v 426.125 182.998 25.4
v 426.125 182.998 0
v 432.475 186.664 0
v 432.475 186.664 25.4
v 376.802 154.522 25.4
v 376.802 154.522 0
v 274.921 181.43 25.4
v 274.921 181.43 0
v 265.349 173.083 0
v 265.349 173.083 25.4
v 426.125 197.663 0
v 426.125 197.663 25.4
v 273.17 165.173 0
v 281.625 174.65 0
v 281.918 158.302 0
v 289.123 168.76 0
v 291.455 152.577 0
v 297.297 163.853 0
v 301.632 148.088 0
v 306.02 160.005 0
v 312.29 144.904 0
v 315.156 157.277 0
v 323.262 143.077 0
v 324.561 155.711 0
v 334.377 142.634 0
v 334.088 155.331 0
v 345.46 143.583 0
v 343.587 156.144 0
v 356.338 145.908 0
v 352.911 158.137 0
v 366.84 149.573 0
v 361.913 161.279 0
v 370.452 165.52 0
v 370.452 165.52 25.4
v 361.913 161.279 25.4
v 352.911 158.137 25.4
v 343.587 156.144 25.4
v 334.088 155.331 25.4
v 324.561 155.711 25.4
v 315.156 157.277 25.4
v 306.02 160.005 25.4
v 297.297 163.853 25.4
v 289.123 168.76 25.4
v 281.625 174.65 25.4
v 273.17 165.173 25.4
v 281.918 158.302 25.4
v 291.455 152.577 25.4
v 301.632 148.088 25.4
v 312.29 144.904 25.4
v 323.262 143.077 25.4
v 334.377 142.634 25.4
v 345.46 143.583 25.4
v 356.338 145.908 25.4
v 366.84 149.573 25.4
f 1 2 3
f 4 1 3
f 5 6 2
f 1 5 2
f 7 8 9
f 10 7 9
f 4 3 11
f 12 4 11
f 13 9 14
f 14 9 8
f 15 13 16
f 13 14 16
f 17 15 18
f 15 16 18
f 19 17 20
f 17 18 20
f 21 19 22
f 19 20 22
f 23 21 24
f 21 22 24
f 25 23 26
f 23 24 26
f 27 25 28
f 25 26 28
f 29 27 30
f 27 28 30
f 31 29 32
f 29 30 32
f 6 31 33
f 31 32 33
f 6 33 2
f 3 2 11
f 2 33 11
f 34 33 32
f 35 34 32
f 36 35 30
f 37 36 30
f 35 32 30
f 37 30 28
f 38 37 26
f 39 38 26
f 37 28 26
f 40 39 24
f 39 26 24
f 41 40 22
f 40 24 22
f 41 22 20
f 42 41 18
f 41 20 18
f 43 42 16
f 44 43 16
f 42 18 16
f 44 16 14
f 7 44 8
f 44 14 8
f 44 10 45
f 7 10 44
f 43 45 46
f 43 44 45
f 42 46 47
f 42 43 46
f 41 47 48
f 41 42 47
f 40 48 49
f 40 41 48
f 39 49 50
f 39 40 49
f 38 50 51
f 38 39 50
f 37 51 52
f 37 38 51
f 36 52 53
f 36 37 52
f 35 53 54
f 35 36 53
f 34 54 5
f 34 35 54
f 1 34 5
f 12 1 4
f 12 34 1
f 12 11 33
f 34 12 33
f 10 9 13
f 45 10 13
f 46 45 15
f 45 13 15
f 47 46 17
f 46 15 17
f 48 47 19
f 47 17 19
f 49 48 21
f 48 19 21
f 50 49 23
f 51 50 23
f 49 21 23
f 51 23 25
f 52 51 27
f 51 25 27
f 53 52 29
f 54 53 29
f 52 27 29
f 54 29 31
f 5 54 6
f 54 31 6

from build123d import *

# Parameters (mm, degrees)
F1_DEPTH = 25.4


with BuildPart() as f1:
    # F0 (on Top) → F1 (new body)
    with BuildSketch(Plane.XY):
        with BuildLine():
            Line((376.802053, 154.521519), (426.124698, 182.997961))
            Line((426.124698, 182.997961), (432.474698, 186.664135))
            Line((432.474698, 186.664135), (426.124698, 197.662657))
            Line((426.124698, 197.662657), (370.452053, 165.520041))
            ThreePointArc((370.452053, 165.520041), (319.833994, 156.346437), (274.921166, 181.429912))
            Line((274.921166, 181.429912), (265.349351, 173.083034))
            ThreePointArc((265.349351, 173.083034), (317.747651, 143.81898), (376.802053, 154.521519))
        make_face()
    extrude(amount=F1_DEPTH)


solid = f1.part
